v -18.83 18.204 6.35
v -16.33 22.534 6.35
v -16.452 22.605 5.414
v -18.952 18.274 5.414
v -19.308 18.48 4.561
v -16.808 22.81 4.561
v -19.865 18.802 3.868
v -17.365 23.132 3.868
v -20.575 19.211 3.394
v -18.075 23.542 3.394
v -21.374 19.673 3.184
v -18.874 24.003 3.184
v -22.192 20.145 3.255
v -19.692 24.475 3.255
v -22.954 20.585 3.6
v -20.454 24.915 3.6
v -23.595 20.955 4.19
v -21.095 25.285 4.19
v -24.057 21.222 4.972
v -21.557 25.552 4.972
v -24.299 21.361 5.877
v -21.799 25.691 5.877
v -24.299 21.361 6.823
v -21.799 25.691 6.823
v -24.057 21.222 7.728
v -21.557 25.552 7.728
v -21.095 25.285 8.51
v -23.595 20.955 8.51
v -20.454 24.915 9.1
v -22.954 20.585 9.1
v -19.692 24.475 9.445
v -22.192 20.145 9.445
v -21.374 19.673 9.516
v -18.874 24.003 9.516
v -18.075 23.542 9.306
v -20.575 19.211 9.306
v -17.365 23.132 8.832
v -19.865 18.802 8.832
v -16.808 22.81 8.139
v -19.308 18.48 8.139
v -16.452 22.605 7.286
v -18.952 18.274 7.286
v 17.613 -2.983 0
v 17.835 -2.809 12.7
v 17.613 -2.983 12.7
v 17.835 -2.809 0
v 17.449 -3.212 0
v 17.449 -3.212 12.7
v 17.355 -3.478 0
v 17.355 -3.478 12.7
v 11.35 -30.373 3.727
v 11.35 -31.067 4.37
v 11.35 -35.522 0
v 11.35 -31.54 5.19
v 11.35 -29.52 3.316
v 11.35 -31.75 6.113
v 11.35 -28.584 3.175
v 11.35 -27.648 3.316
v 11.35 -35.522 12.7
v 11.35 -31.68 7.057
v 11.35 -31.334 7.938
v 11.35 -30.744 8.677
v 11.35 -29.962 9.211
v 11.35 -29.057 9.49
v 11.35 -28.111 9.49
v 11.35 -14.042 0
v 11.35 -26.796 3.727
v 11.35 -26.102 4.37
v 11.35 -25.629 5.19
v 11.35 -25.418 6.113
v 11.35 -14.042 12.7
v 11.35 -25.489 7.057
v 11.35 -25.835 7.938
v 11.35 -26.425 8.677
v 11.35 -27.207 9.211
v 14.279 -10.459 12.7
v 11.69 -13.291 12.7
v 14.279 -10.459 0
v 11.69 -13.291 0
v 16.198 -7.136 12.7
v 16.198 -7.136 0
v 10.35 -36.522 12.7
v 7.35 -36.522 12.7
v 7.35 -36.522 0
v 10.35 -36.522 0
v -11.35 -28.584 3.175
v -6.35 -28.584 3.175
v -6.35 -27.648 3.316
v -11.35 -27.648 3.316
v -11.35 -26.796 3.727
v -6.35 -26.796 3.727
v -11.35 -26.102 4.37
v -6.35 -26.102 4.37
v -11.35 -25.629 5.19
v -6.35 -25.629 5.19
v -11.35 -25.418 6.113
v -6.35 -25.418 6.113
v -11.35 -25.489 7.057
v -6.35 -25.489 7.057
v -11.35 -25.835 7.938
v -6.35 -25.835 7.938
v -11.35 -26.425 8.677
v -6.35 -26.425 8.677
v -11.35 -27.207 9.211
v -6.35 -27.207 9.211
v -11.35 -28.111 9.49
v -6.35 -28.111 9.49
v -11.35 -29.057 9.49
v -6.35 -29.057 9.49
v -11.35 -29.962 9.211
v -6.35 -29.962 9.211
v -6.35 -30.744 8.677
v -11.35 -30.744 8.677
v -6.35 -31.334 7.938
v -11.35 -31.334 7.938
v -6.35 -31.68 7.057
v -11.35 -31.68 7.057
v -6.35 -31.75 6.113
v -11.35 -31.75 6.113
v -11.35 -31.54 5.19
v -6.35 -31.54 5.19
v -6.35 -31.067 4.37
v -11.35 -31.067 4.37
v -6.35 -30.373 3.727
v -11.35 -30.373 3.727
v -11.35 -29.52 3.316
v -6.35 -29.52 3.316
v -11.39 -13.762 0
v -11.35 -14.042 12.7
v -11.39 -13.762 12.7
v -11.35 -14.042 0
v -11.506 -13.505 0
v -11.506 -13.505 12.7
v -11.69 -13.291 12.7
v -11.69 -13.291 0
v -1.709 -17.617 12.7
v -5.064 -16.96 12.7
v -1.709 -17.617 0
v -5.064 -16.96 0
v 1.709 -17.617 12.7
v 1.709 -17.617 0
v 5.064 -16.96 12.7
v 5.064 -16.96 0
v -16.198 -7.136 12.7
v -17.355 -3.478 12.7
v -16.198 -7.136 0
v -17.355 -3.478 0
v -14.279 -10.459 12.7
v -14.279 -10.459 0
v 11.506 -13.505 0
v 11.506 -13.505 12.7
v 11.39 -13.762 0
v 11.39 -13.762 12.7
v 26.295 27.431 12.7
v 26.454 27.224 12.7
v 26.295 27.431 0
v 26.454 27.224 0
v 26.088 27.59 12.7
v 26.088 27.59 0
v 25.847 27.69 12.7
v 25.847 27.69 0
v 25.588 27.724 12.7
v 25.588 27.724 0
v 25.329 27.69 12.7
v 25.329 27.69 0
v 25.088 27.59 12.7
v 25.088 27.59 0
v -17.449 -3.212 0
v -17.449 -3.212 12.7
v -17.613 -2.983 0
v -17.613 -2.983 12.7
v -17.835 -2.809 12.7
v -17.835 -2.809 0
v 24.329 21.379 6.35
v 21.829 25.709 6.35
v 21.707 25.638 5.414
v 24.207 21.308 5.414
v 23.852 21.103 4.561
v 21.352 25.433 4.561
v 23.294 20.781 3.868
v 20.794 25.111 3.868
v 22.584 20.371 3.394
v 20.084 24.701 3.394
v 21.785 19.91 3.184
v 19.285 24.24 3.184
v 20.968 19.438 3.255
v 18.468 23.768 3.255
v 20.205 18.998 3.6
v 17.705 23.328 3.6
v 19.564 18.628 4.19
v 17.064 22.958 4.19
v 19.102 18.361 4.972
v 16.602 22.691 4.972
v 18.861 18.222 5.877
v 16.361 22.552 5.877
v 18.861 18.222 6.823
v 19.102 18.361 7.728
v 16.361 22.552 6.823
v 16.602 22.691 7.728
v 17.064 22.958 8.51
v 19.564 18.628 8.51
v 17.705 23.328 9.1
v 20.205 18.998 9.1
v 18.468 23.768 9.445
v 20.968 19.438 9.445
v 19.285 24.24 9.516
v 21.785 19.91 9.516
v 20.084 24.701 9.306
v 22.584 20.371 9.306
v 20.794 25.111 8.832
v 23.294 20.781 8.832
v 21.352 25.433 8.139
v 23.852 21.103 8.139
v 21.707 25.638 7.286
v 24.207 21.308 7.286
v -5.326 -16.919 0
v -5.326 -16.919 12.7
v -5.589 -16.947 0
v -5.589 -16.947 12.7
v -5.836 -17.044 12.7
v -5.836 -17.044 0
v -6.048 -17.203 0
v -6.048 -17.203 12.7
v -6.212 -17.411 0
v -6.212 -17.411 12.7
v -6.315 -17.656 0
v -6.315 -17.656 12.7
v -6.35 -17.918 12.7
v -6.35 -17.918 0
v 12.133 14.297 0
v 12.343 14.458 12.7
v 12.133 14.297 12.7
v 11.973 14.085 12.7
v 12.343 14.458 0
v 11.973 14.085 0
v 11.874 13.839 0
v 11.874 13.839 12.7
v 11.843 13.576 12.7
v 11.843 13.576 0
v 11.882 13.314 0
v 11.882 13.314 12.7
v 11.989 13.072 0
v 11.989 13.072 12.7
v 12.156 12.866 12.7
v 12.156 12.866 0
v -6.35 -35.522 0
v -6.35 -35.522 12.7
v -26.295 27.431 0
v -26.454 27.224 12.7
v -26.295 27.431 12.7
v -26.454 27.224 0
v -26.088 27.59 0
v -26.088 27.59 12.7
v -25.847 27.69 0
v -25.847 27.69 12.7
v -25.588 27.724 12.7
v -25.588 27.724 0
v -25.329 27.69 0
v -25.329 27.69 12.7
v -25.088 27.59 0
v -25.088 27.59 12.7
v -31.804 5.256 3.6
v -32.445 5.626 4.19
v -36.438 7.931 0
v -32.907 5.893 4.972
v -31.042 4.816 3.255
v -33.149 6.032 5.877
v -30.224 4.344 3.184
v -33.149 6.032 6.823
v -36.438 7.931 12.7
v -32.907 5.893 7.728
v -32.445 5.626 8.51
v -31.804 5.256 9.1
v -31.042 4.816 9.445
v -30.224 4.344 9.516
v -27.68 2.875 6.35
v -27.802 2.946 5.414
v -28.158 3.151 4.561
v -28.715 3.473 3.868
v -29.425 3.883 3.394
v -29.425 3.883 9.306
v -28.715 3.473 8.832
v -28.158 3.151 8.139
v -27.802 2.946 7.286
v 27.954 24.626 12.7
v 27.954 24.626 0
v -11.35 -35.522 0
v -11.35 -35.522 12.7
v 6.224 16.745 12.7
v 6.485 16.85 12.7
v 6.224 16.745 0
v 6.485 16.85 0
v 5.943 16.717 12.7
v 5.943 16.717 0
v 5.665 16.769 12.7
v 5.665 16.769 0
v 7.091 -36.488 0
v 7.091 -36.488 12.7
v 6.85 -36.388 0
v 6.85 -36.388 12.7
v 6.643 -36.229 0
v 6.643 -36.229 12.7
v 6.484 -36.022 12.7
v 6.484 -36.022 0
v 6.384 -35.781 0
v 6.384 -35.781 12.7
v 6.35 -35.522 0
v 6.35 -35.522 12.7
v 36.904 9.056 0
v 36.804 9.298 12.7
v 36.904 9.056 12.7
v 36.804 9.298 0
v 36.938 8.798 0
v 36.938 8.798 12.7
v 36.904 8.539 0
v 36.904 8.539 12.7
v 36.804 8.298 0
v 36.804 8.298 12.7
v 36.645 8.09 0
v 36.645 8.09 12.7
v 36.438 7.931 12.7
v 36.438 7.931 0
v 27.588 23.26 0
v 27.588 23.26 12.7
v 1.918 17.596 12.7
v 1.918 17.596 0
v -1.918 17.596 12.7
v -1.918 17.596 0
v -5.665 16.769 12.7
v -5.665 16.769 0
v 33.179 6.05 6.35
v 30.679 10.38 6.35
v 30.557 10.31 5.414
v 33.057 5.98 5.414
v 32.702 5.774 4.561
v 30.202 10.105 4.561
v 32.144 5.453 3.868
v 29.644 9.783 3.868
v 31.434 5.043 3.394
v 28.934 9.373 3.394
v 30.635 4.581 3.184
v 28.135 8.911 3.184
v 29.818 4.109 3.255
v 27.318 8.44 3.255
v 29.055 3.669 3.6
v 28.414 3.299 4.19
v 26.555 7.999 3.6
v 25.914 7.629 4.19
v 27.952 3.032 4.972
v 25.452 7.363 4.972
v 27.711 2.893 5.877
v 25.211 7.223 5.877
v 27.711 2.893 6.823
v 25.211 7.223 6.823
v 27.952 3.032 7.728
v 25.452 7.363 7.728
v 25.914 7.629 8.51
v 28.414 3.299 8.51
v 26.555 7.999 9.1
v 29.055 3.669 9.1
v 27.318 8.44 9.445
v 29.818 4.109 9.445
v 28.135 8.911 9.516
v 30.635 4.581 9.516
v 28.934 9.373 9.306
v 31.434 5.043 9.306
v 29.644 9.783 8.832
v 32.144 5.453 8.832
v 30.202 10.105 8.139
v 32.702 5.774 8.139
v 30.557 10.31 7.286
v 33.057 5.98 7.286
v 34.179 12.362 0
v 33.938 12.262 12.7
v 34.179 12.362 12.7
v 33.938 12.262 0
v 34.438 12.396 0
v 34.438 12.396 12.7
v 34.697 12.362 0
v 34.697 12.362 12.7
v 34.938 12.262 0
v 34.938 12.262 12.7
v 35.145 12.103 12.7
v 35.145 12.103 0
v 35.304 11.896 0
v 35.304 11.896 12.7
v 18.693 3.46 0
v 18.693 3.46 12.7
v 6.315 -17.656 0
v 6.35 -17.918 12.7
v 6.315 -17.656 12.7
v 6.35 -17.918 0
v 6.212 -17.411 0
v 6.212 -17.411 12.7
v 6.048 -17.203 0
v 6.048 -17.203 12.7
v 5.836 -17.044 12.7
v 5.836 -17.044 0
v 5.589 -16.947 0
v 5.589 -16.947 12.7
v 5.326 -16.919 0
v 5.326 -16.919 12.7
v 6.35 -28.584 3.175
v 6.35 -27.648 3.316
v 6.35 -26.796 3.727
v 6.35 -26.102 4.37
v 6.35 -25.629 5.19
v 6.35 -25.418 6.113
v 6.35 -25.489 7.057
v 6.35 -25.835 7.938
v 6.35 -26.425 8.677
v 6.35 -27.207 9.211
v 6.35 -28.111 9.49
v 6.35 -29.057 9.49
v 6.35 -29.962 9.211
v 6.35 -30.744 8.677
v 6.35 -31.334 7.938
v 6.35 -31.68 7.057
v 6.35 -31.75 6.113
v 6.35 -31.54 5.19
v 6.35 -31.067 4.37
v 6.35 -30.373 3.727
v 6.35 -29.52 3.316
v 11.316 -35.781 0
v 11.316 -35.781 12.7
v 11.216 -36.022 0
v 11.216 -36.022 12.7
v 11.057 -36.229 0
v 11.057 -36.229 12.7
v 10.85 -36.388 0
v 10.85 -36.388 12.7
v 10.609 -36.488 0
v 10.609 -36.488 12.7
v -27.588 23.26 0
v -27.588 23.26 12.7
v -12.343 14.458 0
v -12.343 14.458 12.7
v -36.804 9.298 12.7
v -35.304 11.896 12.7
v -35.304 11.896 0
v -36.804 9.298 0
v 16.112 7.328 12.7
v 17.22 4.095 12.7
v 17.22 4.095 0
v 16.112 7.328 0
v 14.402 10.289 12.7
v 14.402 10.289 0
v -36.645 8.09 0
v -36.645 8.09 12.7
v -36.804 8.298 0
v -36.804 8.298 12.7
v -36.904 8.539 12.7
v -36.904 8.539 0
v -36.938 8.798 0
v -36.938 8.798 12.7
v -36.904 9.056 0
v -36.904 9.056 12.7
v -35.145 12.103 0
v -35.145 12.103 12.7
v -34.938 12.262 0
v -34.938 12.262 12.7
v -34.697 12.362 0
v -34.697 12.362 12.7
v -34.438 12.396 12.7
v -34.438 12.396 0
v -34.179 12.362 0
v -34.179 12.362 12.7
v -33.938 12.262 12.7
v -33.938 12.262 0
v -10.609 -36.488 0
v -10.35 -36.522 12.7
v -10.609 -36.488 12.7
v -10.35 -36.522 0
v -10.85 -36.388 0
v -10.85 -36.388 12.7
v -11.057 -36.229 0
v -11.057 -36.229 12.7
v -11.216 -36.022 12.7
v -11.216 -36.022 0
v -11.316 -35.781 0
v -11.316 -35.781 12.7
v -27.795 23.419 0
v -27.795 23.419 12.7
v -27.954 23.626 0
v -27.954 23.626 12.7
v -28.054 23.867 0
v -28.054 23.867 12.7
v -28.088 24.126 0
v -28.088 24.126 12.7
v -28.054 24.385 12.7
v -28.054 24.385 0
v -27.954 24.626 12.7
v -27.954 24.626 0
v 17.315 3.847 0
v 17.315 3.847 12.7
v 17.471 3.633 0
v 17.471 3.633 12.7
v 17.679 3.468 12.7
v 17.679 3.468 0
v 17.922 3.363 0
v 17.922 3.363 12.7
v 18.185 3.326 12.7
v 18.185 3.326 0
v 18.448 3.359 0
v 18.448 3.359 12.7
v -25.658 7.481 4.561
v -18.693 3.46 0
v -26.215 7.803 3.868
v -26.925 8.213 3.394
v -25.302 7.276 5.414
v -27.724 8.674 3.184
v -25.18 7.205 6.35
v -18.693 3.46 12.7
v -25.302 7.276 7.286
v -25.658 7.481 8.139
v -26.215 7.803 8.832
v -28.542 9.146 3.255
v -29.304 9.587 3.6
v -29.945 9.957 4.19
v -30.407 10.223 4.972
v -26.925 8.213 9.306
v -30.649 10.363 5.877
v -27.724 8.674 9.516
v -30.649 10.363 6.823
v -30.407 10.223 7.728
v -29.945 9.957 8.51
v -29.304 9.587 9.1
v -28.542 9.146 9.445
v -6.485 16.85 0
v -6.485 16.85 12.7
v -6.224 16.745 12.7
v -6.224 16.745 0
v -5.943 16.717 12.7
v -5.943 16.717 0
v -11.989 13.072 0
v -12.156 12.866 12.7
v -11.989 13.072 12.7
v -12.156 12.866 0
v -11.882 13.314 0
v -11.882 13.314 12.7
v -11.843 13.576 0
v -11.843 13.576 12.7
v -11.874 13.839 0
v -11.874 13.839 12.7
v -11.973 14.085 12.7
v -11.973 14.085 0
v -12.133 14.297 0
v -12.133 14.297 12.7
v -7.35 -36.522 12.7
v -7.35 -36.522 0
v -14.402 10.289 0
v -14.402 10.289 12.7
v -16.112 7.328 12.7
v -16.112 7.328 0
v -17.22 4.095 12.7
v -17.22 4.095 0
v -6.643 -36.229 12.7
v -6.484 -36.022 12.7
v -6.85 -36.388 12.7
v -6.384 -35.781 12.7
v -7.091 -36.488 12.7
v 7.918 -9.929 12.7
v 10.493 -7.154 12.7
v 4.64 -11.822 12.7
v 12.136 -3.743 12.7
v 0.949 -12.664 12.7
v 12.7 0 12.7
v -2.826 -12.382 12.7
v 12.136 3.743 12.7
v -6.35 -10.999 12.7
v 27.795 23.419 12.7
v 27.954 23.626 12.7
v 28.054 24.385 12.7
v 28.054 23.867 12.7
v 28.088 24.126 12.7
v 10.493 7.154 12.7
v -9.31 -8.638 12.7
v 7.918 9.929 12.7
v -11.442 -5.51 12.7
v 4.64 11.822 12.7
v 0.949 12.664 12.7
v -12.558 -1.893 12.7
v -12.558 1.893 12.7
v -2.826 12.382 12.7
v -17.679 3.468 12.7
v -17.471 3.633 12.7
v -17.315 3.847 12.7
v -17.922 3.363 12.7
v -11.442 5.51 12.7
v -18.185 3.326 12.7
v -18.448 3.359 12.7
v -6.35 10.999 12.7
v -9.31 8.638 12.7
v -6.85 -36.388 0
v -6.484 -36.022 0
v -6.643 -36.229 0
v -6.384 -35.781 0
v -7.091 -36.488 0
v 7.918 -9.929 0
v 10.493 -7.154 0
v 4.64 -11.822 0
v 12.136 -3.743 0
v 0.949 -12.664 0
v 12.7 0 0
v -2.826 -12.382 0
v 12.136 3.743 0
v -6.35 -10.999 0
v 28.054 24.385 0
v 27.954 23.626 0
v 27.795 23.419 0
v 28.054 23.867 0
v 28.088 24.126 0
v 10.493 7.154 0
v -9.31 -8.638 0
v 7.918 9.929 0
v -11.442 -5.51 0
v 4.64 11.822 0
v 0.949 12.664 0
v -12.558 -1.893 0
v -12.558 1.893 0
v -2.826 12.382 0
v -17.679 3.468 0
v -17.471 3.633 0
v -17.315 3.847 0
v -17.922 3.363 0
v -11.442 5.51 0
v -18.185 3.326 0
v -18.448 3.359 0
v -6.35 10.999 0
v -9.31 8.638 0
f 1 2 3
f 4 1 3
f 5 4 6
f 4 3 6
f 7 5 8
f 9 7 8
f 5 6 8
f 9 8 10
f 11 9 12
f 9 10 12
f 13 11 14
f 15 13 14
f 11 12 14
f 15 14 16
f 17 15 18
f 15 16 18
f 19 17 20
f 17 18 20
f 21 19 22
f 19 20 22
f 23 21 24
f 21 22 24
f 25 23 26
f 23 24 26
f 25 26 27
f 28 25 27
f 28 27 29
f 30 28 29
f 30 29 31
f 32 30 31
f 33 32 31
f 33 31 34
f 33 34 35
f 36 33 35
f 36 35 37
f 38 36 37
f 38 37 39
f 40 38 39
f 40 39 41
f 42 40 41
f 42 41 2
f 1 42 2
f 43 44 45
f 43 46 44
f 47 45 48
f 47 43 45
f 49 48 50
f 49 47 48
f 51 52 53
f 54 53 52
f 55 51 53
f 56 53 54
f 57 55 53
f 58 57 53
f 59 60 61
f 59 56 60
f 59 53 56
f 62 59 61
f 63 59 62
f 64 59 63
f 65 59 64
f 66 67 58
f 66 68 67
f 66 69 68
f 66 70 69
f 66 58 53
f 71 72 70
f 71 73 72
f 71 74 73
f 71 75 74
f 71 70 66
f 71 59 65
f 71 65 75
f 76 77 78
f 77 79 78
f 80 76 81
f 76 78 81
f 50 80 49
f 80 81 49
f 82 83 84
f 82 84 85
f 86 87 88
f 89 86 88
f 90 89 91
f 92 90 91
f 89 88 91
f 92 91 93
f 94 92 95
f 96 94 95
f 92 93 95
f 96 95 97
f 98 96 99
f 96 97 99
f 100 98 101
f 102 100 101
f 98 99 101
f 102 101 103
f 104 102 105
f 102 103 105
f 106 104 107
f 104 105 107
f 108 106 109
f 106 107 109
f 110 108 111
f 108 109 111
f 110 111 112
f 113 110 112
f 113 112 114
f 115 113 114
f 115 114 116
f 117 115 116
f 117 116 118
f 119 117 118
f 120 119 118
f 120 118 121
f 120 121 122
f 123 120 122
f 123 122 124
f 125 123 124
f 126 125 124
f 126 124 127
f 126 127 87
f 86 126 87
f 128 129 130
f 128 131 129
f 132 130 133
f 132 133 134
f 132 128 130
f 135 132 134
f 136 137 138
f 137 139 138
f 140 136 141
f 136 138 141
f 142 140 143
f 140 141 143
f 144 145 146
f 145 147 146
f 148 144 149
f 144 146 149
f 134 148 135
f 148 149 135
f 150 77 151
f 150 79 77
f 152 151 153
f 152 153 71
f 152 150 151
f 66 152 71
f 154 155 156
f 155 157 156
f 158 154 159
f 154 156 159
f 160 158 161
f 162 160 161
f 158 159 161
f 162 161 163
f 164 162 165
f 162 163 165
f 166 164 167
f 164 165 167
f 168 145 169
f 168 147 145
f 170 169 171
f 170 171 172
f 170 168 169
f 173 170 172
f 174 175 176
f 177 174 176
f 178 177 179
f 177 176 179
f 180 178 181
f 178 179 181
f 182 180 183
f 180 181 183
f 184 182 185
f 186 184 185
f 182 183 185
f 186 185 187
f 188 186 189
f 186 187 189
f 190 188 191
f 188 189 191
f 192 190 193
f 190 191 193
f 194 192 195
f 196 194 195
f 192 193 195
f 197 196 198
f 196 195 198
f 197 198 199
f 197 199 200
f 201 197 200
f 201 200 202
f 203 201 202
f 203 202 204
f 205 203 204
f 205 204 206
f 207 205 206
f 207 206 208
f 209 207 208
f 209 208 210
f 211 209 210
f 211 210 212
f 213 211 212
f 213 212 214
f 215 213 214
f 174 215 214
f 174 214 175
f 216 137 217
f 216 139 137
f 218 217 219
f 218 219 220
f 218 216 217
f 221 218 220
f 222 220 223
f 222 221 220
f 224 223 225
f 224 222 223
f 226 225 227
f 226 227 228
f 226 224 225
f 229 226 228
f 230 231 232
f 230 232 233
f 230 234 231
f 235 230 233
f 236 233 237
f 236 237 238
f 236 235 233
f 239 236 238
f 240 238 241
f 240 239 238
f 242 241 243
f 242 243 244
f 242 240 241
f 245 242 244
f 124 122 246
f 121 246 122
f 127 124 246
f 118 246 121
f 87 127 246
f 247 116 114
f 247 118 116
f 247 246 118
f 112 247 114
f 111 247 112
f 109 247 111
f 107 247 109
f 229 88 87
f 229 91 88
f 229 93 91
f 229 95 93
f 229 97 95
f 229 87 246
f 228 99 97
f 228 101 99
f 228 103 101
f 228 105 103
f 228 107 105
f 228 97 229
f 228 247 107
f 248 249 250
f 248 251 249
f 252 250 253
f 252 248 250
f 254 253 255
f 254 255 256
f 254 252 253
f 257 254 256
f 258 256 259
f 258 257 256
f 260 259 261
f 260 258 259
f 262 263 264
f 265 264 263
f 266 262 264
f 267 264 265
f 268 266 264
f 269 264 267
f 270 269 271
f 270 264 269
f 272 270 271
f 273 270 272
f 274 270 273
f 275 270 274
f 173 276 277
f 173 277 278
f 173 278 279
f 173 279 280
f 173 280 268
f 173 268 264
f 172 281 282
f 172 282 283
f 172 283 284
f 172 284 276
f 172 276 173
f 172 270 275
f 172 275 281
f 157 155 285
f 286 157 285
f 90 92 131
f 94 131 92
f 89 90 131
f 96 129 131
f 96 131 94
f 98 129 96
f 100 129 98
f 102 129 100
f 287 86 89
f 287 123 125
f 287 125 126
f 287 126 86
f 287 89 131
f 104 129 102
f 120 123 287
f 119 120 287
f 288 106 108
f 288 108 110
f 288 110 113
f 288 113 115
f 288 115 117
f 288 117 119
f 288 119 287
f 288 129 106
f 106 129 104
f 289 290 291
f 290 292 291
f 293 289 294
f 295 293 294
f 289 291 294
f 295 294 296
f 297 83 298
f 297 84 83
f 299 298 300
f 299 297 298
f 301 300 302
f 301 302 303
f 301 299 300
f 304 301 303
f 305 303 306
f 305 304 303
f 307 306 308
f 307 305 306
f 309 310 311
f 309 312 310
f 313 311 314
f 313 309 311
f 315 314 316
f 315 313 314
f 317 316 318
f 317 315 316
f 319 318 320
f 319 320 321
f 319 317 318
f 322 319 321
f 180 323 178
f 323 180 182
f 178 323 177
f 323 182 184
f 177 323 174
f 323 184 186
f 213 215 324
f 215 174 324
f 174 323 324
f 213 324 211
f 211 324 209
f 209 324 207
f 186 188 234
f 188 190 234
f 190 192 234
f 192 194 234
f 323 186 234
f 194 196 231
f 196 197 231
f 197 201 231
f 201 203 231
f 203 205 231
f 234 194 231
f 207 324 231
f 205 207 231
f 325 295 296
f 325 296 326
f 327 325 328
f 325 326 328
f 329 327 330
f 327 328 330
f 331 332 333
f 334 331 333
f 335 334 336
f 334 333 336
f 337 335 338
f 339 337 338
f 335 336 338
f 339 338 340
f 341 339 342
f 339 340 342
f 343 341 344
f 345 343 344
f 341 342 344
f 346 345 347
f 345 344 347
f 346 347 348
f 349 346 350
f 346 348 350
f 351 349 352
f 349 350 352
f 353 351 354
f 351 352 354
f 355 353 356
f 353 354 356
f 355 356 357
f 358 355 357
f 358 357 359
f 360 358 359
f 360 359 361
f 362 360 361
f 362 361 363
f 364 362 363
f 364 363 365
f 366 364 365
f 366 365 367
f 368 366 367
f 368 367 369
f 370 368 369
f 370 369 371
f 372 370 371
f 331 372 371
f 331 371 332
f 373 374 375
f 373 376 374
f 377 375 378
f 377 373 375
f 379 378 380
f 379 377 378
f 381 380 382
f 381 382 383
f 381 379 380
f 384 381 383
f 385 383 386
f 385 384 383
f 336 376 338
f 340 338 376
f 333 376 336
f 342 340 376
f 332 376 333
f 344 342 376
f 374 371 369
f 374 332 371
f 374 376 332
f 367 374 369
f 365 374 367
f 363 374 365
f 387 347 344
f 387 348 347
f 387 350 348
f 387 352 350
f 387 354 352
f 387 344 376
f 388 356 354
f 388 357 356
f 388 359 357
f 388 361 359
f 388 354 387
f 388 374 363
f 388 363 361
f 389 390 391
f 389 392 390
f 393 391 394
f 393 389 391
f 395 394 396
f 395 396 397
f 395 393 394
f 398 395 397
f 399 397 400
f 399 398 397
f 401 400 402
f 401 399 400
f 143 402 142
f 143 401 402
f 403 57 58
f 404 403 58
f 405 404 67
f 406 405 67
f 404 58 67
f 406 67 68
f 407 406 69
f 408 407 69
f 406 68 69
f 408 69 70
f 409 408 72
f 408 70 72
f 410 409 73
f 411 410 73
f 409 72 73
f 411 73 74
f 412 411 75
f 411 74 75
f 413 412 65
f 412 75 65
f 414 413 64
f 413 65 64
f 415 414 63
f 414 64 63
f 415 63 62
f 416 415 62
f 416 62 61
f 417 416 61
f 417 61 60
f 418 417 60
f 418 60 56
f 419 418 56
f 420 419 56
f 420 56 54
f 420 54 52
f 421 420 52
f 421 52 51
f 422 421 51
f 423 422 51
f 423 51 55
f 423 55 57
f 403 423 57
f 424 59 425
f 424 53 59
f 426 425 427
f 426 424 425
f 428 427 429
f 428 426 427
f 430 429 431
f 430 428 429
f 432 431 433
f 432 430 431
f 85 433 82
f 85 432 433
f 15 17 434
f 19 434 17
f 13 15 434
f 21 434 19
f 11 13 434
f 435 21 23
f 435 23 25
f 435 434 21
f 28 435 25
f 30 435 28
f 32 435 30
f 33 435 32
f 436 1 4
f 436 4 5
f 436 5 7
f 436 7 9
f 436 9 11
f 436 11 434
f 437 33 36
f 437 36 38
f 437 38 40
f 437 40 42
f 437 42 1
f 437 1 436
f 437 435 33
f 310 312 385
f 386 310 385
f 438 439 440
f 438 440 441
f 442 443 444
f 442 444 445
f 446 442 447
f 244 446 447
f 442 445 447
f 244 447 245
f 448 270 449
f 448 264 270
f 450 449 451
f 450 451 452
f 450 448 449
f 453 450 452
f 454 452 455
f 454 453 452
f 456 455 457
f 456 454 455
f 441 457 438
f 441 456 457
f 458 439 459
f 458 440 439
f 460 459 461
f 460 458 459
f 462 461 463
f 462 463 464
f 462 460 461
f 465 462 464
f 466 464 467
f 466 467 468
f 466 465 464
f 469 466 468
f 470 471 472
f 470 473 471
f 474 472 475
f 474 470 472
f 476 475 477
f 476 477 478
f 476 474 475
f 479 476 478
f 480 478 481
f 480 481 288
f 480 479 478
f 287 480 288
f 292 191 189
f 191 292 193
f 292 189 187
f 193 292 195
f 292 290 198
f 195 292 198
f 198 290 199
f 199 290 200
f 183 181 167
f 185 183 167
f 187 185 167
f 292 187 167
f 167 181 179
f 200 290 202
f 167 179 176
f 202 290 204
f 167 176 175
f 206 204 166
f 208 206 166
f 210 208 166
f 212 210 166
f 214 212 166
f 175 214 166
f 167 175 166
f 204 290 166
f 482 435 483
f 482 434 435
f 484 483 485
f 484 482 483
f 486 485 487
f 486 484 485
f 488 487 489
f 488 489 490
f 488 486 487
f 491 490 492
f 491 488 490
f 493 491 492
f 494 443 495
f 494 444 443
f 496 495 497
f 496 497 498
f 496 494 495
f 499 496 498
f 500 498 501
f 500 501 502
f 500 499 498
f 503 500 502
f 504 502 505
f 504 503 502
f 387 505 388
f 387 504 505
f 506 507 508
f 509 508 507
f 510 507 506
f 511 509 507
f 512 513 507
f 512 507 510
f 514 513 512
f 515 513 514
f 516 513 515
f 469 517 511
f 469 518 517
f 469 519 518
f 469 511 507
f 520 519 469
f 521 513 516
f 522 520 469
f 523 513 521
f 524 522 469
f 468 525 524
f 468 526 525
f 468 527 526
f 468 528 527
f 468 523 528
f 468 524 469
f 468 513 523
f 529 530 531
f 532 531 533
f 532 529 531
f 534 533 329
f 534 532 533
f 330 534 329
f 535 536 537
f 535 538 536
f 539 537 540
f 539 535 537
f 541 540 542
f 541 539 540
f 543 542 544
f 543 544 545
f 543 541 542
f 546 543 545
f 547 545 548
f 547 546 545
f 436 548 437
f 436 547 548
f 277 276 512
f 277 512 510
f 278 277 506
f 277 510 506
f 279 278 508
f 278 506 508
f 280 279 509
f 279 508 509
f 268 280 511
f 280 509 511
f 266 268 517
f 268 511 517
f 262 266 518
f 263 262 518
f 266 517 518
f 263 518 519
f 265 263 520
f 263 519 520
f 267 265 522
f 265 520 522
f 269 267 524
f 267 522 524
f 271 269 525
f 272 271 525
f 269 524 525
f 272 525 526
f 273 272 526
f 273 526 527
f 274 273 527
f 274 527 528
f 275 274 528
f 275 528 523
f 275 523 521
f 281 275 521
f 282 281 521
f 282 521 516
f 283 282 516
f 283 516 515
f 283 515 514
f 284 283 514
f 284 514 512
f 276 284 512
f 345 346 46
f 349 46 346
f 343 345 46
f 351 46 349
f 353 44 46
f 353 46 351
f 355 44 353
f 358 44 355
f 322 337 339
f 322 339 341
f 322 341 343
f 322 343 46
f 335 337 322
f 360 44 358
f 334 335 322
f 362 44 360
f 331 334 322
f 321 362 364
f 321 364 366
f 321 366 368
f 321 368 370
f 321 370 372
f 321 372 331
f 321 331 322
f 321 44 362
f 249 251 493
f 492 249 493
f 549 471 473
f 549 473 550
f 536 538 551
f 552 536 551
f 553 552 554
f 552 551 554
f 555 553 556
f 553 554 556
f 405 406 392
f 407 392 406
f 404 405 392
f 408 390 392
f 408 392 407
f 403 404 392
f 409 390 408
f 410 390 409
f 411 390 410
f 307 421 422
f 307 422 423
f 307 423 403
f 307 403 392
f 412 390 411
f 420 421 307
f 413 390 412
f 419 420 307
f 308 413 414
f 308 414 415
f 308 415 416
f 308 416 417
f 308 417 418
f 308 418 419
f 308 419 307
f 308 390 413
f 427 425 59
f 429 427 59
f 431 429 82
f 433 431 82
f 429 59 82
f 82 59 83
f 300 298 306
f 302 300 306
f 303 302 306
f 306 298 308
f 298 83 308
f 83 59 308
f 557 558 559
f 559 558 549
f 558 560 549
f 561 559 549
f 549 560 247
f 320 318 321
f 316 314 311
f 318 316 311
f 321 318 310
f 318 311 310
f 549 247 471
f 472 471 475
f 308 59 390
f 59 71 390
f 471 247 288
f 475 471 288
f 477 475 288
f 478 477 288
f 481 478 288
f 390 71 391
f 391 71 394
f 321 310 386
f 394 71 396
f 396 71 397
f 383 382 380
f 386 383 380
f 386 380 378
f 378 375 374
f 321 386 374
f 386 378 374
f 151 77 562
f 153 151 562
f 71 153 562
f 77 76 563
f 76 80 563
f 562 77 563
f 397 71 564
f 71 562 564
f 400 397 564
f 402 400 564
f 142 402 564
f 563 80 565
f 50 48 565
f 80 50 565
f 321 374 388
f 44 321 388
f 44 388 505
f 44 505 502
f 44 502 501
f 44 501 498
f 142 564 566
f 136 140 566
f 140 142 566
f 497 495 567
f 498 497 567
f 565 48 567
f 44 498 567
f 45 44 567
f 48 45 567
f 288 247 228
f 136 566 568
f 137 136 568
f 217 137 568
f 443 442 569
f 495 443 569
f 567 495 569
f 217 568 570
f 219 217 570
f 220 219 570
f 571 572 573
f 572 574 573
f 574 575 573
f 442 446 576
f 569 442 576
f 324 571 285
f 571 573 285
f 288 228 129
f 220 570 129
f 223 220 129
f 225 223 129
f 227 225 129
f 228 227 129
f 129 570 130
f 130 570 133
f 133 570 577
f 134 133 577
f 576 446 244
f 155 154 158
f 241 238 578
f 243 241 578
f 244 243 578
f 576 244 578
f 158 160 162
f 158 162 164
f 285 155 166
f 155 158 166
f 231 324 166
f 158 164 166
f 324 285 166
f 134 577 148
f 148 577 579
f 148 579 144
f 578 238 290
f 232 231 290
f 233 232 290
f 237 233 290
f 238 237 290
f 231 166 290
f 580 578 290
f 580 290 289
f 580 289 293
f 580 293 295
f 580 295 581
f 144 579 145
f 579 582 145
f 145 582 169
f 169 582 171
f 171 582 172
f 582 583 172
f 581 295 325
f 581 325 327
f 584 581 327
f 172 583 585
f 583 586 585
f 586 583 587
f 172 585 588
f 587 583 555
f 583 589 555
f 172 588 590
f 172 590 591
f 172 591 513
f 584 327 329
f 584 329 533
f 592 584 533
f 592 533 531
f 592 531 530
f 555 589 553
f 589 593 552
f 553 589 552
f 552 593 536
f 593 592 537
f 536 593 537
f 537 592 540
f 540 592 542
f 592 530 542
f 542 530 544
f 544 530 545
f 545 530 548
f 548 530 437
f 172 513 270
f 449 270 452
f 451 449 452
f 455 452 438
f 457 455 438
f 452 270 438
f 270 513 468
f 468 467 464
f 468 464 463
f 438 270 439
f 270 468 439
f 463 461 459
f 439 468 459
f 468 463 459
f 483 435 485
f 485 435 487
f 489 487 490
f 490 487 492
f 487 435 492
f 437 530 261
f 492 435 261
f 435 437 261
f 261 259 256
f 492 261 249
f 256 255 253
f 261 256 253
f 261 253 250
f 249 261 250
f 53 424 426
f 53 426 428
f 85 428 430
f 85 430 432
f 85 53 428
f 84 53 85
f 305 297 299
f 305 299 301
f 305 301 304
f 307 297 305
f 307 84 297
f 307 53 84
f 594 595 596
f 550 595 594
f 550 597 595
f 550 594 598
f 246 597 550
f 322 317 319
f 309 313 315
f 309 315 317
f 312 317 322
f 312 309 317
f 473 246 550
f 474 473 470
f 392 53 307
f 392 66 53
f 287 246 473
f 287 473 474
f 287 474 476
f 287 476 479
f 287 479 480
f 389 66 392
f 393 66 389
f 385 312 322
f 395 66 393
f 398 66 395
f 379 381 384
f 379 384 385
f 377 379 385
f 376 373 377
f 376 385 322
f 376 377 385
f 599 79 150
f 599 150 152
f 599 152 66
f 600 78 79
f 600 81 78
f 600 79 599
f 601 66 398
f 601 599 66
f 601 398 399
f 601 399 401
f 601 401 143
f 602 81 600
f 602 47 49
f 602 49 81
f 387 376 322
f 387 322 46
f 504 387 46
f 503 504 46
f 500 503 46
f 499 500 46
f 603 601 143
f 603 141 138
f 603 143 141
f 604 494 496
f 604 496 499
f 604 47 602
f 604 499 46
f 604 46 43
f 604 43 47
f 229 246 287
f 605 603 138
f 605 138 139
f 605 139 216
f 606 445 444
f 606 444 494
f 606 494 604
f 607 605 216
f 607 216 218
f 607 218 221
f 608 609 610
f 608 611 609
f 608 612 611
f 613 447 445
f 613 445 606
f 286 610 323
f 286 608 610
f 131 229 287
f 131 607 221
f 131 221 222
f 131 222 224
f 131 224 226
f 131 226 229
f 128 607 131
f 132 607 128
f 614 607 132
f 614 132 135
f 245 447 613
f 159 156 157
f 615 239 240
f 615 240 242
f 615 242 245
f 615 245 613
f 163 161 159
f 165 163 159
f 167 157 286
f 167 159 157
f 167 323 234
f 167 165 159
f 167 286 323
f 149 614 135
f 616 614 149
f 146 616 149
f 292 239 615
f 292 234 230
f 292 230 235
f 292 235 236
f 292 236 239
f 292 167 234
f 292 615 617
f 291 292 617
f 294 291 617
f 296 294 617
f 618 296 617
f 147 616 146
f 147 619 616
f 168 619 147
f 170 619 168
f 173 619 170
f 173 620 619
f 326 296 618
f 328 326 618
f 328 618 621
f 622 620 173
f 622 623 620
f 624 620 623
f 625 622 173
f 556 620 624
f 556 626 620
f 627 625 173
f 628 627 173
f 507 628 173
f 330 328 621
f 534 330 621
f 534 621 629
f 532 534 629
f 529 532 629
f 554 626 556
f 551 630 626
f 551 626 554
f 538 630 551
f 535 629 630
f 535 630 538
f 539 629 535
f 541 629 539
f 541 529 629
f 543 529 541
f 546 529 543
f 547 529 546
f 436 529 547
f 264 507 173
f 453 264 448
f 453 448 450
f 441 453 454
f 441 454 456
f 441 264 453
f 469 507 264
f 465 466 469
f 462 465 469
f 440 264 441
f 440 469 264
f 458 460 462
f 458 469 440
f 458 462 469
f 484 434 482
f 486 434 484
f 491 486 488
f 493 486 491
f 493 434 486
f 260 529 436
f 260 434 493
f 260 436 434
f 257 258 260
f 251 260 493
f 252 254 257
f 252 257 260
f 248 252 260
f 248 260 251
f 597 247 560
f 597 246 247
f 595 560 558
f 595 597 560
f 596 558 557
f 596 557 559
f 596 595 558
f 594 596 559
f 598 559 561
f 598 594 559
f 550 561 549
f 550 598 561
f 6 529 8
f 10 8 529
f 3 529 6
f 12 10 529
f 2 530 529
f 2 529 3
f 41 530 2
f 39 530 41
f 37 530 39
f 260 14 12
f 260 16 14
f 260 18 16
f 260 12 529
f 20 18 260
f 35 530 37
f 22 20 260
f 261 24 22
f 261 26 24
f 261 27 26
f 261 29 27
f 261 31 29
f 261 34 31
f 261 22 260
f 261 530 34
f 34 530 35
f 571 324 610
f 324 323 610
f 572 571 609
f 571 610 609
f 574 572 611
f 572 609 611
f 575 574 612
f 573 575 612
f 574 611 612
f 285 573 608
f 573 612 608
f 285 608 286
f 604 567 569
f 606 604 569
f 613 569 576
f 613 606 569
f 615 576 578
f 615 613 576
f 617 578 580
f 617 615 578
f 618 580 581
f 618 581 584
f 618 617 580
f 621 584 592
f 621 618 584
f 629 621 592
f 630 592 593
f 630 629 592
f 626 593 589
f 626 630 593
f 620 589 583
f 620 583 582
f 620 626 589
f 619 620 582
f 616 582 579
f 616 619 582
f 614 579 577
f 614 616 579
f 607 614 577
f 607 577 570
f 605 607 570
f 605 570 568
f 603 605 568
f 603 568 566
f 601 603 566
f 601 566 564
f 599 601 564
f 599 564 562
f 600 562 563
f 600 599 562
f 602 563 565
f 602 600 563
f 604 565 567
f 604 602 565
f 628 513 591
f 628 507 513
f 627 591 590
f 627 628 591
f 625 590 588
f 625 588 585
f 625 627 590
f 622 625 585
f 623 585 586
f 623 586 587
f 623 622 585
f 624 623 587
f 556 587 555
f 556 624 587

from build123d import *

# Parameters (mm, degrees)
ESQUISSE1_R             = 17.7
ESQUISSE1_R_2           = 12.7
BOSS_EXTRU_1_DEPTH      = 12.7
BOSS_EXTRU_2_DEPTH      = 12.7
ESQUISSE3_R             = 3.175
ENL_V_MAT_EXTRU_1_DEPTH = 62.63061651
ESQUISSE4_R             = 3.175
ENL_V_MAT_EXTRU_2_DEPTH = 62.63061651
ESQUISSE5_R             = 3.175
ENL_V_MAT_EXTRU_3_DEPTH = 49.65374434
CONG_1_R                = 1


with BuildPart() as part:
    # Esquisse1 → Boss.-Extru.1 (new body)
    with BuildSketch(Plane.XY):
        Circle(ESQUISSE1_R)
        Circle(ESQUISSE1_R_2, mode=Mode.SUBTRACT)
    extrude(amount=BOSS_EXTRU_1_DEPTH)

    # Esquisse2 → Boss.-Extru.2 (add)
    with BuildSketch(Plane.XY.offset(12.7)):
        Polygon((28.45374434, 23.760125373), (11.133236264, 13.760125373), (6.087254248, 16.620328989), (25.95374434, 28.090252392), align=None)
        Polygon((17.483236264, 2.761602745), (17.437254248, -3.038447676), (37.30374434, 8.431475726), (34.80374434, 12.761602745), align=None)
        Polygon((11.35, -36.521728118), (11.35, -13.581881313), (6.35, -16.521728118), (6.35, -36.521728118), align=None)
        Polygon((-6.35, -16.521728118), (-11.35, -13.581881313), (-11.35, -36.521728118), (-6.35, -36.521728118), align=None)
        Polygon((-37.30374434, 8.431475726), (-17.437254248, -3.038447676), (-17.483236264, 2.761602745), (-34.80374434, 12.761602745), align=None)
        Polygon((-11.133236264, 13.760125373), (-6.087254248, 16.620328989), (-25.95374434, 28.090252392), (-28.45374434, 23.760125373), align=None)
    extrude(amount=-BOSS_EXTRU_2_DEPTH)

    # Esquisse3 → Enlèv. mat.-Extru.1 (cut, through all)
    with BuildSketch(Plane(origin=(5.675, 9.829388333, 0), x_dir=(0.866025404, -0.5, 0), z_dir=(0.5, 0.866025404, 0))):
        with Locations((-28.584228118, -6.35)):
            Circle(ESQUISSE3_R)
    extrude(amount=-ENL_V_MAT_EXTRU_1_DEPTH, mode=Mode.SUBTRACT)

    # Esquisse4 → Enlèv. mat.-Extru.2 (cut, through all)
    with BuildSketch(Plane(origin=(-5.675, 9.829388333, 0), x_dir=(0.866025404, 0.5, 0), z_dir=(-0.5, 0.866025404, 0))):
        with Locations((28.584228118, -6.35)):
            Circle(ESQUISSE4_R)
    extrude(amount=-ENL_V_MAT_EXTRU_2_DEPTH, mode=Mode.SUBTRACT)

    # Esquisse5 → Enlèv. mat.-Extru.3 (cut, through all)
    with BuildSketch(Plane(origin=(11.35, 0, 0), x_dir=(0, 0, -1), z_dir=(1, 0, 0))):
        with Locations((-6.35, -28.584228118)):
            Circle(ESQUISSE5_R)
    extrude(amount=-ENL_V_MAT_EXTRU_3_DEPTH, mode=Mode.SUBTRACT)

    # Congé1
    cong_1_edges = [part.edges().sort_by_distance(p)[0] for p in [
        (25.95374434, 28.090252392, 6.35),
        (28.45374434, 23.760125373, 6.35),
        (11.133236264, 13.760125373, 6.35),
        (6.087254248, 16.620328989, 6.35),
        (17.483236264, 2.761602745, 6.35),
        (34.80374434, 12.761602745, 6.35),
        (37.30374434, 8.431475726, 6.35),
        (17.437254248, -3.038447676, 6.35),
        (11.35, -36.521728118, 6.35),
        (6.35, -36.521728118, 6.35),
        (6.35, -16.521728118, 6.35),
        (11.35, -13.581881313, 6.35),
        (-6.35, -16.521728118, 6.35),
        (-6.35, -36.521728118, 6.35),
        (-11.35, -36.521728118, 6.35),
        (-11.35, -13.581881313, 6.35),
        (-37.30374434, 8.431475726, 6.35),
        (-34.80374434, 12.761602745, 6.35),
        (-17.483236264, 2.761602745, 6.35),
        (-17.437254248, -3.038447676, 6.35),
        (-11.133236264, 13.760125373, 6.35),
        (-28.45374434, 23.760125373, 6.35),
        (-25.95374434, 28.090252392, 6.35),
        (-6.087254248, 16.620328989, 6.35),
    ]]
    fillet(cong_1_edges, radius=CONG_1_R)


solid = part.part
